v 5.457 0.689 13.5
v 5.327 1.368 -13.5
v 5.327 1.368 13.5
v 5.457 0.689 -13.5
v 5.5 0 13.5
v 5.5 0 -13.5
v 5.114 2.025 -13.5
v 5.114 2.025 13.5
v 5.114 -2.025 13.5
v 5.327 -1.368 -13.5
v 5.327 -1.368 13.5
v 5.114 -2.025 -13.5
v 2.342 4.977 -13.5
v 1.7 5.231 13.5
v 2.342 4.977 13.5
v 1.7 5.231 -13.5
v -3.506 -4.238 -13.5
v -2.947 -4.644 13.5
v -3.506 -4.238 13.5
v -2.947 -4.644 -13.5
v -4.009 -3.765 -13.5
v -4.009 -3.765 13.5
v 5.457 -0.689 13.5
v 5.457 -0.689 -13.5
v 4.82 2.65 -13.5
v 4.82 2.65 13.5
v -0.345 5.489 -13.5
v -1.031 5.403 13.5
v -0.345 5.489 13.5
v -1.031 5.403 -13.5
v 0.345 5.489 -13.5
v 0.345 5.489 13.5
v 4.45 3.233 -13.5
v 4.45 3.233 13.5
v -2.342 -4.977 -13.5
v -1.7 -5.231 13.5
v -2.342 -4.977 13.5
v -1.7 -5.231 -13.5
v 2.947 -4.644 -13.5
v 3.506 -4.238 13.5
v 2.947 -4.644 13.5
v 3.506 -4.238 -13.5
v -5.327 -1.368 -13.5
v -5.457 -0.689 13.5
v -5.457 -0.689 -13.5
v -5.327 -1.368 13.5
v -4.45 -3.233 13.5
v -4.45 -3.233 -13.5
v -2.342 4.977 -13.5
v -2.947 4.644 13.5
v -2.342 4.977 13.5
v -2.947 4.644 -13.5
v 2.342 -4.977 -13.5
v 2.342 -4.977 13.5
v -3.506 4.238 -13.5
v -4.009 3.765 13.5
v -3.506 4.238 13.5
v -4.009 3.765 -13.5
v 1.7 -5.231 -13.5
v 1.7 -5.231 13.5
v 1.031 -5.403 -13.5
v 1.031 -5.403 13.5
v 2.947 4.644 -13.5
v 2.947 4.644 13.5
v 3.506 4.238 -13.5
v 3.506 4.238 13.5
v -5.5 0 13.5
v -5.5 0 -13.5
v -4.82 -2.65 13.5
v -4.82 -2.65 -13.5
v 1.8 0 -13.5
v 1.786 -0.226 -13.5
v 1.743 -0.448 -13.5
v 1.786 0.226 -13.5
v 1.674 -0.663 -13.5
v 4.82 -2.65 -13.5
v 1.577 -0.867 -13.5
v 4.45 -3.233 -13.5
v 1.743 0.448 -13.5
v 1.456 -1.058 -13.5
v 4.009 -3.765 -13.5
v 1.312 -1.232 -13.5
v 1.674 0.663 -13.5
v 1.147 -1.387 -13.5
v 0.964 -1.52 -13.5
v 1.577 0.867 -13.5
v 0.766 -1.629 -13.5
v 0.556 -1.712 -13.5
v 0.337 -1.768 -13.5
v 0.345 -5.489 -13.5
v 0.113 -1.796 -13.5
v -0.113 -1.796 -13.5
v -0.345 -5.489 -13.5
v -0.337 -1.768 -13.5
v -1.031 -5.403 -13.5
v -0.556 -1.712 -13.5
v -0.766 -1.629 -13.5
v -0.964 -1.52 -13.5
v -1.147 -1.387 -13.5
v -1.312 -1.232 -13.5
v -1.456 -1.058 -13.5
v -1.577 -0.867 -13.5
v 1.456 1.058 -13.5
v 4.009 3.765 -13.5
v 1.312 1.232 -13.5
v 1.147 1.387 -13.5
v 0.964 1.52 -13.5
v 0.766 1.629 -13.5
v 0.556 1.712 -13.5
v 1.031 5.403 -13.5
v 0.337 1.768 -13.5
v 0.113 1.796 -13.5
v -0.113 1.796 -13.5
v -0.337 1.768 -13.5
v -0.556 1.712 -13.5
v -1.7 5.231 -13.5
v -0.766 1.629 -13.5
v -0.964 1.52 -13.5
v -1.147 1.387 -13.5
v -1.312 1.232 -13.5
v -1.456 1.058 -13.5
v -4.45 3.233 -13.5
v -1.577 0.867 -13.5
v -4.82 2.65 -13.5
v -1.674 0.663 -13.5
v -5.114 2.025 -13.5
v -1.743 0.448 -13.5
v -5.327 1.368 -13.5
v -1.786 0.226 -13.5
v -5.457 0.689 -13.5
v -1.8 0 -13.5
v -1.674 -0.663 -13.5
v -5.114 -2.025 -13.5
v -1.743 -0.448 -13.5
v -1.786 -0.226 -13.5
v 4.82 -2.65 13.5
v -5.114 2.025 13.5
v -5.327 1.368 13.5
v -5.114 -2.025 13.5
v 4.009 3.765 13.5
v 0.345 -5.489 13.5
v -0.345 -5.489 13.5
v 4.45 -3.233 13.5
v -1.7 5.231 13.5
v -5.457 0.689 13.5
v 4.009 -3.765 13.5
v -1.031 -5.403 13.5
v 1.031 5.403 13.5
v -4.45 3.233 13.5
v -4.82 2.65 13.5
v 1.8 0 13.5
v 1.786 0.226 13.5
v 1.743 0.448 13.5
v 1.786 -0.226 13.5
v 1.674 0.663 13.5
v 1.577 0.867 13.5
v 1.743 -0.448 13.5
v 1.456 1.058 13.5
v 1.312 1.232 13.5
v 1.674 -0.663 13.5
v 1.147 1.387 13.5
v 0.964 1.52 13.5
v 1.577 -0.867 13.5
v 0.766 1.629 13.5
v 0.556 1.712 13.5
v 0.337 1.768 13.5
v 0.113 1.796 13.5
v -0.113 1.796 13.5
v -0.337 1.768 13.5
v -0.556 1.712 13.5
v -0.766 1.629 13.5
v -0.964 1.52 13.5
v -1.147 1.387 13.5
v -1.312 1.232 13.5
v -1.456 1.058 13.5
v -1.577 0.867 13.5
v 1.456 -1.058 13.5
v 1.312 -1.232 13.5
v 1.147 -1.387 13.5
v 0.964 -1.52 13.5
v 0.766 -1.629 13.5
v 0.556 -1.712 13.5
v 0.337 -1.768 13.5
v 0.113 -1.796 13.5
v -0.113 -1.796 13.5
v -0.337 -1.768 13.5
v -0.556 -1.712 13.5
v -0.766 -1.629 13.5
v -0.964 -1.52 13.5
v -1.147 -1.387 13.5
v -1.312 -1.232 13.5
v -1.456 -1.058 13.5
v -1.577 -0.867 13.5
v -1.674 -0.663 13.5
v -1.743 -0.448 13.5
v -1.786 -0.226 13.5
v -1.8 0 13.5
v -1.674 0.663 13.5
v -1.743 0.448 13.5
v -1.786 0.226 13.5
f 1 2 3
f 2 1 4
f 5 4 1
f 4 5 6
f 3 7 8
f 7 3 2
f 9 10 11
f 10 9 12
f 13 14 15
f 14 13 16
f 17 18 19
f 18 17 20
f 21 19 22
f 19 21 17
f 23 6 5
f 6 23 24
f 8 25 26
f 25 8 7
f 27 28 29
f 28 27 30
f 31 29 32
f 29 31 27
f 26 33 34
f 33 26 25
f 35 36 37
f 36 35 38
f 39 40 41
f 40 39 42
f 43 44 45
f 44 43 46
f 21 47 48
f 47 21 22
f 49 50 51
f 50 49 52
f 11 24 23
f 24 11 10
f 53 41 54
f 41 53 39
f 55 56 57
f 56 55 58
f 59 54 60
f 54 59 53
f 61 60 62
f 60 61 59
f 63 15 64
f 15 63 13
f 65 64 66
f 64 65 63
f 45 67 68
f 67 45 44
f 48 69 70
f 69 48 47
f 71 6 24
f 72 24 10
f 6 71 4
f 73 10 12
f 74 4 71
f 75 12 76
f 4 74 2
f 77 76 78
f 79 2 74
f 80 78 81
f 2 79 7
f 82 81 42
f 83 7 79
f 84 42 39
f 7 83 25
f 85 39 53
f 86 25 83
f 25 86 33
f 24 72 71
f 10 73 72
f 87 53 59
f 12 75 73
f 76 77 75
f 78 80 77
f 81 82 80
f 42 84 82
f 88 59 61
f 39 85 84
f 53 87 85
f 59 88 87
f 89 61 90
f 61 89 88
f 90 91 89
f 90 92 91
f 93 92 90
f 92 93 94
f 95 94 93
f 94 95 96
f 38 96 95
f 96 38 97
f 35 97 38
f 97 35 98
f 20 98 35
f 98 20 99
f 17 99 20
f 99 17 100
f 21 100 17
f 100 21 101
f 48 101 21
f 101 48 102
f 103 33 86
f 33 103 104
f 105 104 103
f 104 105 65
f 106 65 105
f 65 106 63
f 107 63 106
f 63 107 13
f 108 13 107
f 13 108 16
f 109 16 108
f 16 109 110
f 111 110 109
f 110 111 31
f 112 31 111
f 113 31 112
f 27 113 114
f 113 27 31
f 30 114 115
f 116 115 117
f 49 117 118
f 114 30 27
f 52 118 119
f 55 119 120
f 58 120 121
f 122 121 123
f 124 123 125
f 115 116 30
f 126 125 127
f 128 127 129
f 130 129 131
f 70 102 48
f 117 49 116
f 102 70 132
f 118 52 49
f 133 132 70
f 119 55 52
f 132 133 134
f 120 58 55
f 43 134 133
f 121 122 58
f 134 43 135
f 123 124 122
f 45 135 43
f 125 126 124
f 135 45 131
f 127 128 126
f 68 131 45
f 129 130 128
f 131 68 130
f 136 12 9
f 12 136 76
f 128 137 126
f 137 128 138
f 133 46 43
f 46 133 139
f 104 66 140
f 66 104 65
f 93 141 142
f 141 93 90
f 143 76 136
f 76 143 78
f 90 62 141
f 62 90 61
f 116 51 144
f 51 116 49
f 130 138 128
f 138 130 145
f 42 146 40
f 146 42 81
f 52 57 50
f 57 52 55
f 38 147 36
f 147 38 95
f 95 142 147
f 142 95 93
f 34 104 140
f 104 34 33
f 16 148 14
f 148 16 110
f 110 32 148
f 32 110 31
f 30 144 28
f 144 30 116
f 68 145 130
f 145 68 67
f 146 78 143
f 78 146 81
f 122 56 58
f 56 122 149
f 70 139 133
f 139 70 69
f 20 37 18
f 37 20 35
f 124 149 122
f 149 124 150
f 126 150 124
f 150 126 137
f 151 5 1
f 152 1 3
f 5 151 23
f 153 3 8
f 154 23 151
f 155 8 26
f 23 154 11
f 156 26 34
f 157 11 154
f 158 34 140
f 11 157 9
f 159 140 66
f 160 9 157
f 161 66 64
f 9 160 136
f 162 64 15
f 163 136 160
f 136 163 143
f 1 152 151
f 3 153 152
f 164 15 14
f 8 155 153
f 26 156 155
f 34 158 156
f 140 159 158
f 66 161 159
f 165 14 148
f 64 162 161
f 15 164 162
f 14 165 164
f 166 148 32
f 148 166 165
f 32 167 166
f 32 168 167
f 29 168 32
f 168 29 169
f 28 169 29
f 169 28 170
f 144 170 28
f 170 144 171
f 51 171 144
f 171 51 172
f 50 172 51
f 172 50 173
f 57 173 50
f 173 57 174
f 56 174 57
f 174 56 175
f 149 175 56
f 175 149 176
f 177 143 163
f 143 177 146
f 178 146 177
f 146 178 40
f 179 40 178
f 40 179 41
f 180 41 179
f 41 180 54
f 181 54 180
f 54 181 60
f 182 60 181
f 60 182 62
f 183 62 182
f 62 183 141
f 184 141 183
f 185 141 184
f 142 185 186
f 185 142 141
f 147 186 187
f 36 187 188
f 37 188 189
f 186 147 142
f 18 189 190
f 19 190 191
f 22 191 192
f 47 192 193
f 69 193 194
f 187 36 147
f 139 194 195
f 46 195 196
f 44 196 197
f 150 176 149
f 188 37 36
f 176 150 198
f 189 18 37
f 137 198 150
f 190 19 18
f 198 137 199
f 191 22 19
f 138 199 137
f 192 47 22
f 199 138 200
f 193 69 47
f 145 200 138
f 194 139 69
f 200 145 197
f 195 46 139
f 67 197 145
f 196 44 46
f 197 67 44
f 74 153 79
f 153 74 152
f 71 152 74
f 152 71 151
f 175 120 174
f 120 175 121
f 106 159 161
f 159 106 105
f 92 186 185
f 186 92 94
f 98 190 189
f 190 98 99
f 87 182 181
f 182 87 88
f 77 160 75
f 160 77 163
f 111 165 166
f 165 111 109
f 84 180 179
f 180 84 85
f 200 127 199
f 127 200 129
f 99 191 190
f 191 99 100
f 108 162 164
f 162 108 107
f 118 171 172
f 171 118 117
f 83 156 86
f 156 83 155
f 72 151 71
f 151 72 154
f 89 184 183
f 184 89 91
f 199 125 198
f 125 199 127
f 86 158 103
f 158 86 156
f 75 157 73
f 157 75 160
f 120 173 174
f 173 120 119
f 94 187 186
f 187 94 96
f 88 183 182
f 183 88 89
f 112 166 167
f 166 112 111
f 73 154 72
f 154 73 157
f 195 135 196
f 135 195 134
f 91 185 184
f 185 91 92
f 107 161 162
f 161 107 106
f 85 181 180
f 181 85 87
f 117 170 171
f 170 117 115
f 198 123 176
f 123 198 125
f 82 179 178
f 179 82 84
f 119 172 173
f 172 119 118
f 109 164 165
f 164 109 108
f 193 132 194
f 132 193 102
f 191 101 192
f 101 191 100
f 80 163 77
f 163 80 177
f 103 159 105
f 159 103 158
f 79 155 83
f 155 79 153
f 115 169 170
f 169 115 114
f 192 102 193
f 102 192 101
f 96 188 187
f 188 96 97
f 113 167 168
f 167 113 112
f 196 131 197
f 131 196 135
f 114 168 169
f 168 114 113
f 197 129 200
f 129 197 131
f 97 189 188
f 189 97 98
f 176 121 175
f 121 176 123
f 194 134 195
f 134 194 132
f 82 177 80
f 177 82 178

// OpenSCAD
$fn = 50;


difference() {
	union() {
		translate(v = [0, 0, -13.5000000000]) {
			cylinder(h = 27, r = 5.5000000000);
		}
	}
	union() {
		#translate(v = [0, 0, -100.0000000000]) {
			cylinder(h = 200, r = 1.8000000000);
		}
	}
}
